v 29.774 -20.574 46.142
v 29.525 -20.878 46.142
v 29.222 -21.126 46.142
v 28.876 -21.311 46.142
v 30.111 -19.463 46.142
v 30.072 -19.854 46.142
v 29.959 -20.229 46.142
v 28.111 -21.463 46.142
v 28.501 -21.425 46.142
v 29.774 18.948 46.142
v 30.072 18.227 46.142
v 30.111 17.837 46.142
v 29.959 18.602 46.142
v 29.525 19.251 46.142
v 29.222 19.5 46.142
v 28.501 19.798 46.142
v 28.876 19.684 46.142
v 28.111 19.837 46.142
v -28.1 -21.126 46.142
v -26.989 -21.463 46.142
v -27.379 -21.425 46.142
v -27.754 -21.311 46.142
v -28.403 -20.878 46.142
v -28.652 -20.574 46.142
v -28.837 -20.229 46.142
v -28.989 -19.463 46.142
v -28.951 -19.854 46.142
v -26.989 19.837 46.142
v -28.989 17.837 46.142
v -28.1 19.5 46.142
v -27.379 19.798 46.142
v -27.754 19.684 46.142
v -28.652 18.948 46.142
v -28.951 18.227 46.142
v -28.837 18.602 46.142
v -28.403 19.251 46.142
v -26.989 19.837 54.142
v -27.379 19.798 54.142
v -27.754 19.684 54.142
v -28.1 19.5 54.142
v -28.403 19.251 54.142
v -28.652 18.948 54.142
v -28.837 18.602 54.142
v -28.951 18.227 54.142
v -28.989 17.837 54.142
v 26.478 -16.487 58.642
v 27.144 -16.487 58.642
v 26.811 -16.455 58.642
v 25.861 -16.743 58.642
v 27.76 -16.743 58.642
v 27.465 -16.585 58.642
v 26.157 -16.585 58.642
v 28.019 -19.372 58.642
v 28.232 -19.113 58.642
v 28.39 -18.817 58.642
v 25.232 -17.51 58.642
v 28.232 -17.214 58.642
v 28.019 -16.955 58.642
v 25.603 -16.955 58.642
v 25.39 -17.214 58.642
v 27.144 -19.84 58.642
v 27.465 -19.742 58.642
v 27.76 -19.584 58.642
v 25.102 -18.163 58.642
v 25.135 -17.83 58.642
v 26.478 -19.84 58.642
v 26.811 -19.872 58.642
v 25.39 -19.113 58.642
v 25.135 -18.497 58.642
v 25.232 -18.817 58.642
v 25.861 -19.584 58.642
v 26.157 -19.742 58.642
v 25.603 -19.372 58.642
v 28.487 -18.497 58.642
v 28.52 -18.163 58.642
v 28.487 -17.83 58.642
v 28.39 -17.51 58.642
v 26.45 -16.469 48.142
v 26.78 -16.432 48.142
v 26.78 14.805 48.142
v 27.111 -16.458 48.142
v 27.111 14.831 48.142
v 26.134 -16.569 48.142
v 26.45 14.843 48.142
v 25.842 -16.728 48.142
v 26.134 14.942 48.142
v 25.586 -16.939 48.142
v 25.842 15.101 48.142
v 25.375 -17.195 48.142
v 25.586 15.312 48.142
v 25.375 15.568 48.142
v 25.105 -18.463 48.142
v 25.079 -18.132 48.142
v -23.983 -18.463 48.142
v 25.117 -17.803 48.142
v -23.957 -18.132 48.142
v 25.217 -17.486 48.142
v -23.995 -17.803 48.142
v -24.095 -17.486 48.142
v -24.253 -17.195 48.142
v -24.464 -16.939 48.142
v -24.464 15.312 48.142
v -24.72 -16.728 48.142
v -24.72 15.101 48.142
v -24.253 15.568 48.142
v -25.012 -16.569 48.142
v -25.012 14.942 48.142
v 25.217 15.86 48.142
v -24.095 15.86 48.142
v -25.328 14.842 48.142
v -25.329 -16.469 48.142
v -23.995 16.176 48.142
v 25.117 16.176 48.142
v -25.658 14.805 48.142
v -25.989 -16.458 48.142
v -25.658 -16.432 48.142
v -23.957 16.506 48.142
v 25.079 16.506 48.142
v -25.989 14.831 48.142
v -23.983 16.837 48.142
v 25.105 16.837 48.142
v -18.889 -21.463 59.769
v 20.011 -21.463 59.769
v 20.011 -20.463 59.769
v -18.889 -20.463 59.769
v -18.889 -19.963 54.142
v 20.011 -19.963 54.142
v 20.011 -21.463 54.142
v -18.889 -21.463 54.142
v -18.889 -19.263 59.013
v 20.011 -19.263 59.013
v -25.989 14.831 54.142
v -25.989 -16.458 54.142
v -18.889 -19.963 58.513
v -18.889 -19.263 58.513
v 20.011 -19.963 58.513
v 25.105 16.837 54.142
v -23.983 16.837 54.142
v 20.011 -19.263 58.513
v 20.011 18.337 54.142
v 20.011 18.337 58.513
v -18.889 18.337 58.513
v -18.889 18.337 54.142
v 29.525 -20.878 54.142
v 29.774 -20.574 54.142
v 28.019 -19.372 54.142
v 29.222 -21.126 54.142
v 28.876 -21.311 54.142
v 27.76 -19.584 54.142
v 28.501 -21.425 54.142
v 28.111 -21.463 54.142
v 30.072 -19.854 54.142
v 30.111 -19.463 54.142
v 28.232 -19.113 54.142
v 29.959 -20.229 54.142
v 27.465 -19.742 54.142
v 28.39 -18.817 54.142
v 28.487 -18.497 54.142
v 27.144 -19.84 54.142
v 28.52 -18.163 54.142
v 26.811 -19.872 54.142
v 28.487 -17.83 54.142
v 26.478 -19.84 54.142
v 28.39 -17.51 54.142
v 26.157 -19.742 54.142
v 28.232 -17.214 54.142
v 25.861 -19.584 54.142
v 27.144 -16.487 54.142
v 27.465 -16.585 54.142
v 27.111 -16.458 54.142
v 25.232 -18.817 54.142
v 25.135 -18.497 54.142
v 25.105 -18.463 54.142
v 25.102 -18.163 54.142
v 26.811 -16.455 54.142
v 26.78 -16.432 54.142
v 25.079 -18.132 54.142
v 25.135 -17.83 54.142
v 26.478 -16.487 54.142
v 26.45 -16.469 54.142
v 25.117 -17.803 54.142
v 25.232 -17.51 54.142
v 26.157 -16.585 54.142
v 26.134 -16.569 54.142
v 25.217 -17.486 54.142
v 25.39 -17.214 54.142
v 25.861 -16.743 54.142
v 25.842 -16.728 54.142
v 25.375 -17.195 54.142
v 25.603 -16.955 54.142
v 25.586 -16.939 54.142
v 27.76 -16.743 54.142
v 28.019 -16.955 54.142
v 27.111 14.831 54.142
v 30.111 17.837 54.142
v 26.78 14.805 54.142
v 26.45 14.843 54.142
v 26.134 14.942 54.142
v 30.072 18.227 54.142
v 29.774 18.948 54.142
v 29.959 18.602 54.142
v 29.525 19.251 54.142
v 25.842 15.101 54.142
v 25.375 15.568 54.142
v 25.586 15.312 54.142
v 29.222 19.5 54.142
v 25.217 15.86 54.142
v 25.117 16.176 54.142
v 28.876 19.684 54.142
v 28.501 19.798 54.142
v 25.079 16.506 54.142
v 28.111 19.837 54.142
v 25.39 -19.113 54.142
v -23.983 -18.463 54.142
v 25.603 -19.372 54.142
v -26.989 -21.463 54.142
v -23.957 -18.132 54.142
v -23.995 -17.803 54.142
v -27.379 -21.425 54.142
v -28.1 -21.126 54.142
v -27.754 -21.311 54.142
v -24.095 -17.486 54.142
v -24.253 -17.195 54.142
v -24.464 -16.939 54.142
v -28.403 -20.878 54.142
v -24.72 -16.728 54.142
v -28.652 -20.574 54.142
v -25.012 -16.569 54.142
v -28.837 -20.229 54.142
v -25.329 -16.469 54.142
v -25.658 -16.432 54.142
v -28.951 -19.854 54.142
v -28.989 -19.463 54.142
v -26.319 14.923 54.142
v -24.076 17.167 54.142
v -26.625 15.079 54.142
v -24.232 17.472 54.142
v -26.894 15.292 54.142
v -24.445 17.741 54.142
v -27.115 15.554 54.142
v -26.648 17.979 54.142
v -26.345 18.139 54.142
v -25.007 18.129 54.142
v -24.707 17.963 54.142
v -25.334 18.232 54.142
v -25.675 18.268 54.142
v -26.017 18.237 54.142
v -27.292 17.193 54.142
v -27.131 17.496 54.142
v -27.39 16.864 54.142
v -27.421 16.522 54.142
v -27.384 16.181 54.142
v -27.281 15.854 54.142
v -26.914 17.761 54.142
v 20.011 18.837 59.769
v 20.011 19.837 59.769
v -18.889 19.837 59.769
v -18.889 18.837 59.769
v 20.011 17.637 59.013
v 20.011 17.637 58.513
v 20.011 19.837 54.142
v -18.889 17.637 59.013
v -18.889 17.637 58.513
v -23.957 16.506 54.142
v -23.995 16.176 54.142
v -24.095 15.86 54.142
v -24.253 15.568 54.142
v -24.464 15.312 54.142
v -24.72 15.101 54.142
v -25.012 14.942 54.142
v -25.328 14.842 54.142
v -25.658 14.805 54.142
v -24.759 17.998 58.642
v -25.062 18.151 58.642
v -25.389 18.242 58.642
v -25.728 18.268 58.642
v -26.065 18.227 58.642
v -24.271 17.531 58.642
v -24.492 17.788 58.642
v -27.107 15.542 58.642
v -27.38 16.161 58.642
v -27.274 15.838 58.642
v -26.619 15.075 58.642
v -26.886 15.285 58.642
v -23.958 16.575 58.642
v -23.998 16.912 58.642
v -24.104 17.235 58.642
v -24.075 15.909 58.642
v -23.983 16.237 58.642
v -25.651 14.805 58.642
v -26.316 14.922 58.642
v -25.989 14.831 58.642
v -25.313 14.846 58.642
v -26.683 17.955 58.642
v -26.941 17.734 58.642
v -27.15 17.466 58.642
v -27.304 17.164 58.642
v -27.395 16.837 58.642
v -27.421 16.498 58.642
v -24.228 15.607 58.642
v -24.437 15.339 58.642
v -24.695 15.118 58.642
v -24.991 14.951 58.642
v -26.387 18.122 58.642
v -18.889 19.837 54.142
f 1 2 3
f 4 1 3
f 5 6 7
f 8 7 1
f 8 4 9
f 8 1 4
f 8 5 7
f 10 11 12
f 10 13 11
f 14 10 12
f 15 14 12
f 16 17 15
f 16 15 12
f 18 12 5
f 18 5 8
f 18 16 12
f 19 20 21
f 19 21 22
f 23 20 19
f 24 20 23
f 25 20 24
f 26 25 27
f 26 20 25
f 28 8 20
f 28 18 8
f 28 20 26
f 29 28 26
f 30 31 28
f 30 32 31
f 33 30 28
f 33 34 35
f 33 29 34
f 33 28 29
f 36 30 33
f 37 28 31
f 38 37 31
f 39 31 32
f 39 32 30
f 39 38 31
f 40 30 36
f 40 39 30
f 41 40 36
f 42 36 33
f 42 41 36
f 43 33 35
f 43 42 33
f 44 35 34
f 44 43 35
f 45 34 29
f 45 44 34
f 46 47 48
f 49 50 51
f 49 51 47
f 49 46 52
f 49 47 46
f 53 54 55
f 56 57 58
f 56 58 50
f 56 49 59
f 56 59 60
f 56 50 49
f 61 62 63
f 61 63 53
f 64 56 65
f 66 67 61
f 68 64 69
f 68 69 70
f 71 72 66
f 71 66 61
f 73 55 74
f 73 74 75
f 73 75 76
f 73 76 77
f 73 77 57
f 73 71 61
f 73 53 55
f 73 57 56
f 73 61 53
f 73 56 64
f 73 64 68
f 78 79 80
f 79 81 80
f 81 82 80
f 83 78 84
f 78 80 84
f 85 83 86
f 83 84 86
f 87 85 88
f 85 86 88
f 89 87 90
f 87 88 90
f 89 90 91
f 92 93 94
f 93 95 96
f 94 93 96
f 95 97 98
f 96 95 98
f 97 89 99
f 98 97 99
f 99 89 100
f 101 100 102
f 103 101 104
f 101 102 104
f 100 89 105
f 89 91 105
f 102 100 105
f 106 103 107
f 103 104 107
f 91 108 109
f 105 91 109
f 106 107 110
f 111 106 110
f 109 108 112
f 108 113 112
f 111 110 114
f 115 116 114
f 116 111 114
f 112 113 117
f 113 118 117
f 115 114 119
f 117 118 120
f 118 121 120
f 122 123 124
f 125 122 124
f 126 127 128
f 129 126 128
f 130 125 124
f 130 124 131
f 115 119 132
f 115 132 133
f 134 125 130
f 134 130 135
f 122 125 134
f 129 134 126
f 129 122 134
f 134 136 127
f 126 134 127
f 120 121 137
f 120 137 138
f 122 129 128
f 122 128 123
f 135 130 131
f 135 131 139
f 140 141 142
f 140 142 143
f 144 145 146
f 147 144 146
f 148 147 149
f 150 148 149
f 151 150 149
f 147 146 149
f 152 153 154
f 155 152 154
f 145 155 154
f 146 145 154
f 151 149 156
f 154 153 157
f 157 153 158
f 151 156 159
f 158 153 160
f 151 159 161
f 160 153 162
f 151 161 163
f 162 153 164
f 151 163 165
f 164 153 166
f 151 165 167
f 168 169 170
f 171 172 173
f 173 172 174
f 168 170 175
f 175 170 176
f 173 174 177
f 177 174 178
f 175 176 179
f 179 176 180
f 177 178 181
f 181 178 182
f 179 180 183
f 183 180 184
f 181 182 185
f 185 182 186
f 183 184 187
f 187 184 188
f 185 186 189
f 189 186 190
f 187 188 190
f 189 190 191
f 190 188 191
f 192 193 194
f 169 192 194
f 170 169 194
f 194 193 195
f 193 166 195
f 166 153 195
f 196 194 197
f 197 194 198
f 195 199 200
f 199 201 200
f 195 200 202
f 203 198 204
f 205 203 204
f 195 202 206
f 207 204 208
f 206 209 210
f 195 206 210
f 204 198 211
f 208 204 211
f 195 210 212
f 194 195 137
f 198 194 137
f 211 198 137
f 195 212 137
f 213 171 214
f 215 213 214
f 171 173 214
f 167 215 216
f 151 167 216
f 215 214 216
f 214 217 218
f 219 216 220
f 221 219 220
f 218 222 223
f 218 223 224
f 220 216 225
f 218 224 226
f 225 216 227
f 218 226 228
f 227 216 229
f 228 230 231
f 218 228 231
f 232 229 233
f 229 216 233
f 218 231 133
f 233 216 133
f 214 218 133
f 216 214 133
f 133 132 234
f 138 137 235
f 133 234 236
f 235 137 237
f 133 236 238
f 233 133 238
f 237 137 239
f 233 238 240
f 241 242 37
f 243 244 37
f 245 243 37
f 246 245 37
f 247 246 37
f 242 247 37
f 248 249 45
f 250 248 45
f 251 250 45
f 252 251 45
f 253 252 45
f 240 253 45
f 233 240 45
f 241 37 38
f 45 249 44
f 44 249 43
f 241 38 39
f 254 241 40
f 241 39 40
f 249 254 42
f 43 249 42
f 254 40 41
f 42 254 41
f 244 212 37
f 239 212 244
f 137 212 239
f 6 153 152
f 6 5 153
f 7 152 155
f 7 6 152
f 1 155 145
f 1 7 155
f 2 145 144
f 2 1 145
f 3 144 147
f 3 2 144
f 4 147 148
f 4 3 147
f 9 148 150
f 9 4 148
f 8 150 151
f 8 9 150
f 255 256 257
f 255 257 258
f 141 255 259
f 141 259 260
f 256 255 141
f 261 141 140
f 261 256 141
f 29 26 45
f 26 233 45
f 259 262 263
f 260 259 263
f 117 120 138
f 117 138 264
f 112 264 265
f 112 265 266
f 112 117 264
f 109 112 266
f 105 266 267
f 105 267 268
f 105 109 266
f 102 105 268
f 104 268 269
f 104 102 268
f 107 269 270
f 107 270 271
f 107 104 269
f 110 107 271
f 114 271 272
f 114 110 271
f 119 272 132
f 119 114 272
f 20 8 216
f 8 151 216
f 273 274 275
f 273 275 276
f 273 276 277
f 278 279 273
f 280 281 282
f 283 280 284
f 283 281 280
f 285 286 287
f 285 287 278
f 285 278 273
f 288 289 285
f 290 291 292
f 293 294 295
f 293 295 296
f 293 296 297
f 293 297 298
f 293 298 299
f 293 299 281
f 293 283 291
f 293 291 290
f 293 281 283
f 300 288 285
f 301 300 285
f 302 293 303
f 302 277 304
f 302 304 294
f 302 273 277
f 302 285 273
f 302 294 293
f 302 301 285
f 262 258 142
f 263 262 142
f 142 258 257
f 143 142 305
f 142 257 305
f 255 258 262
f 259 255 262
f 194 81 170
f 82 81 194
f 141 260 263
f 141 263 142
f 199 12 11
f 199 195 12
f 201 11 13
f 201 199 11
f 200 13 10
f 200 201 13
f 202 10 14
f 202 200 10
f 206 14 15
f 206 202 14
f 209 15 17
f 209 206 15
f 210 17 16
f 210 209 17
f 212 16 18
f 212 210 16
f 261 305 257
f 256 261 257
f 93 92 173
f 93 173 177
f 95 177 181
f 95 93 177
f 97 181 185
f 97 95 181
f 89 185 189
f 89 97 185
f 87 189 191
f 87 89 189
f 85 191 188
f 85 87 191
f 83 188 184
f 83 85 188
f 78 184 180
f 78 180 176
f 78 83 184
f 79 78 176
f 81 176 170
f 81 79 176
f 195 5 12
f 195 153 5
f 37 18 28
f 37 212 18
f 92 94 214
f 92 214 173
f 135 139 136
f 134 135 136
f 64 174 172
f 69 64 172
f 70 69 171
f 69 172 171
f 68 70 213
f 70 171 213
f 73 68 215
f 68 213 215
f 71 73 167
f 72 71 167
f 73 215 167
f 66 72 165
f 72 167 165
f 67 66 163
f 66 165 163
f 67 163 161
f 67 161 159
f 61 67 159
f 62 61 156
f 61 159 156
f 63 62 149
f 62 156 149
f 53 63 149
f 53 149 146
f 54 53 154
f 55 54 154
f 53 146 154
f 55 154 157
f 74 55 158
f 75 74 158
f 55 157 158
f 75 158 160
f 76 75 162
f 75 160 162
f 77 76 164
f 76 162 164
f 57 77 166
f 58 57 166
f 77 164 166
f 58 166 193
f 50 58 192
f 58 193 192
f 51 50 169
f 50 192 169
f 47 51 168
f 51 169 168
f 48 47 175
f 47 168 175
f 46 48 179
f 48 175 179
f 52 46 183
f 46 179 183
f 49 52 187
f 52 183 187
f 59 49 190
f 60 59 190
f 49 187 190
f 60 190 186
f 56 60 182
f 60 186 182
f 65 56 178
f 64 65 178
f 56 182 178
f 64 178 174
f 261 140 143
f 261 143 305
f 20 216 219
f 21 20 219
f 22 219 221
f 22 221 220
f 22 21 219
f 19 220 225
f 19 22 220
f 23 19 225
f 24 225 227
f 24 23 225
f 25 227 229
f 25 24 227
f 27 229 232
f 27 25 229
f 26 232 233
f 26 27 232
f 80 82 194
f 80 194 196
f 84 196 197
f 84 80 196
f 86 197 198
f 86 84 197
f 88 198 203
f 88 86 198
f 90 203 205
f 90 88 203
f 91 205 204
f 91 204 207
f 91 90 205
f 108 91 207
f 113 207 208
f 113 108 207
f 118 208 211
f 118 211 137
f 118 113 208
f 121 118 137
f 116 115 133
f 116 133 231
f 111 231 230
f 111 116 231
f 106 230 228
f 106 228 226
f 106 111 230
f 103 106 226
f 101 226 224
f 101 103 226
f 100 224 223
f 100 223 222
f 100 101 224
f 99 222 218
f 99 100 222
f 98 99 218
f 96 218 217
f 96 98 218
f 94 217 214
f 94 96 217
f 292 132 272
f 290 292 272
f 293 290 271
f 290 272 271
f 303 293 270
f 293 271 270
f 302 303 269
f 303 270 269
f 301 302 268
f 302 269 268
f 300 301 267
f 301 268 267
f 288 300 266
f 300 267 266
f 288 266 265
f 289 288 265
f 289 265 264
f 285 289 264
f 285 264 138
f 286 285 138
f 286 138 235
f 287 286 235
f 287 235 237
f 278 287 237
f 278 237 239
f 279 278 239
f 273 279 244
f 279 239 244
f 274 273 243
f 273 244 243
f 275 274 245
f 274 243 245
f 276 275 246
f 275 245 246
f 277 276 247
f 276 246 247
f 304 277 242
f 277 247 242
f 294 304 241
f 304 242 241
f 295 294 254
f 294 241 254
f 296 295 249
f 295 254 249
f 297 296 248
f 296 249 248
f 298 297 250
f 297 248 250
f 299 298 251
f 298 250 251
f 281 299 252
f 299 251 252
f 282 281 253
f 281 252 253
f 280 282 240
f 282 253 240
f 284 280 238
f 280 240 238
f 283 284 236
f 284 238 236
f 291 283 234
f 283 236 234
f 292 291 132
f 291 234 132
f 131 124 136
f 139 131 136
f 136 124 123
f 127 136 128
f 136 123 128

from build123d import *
from build123d.topology import SkipClean

# Parameters (mm, degrees)
SZKIC1_W                    = 59.100010001
SZKIC1_H                    = 41.299998987
DODANIE_WYCI_GNI_CIE1_DEPTH = 6
SZKIC2_W                    = 59.100010001
SZKIC2_H                    = 41.299998987
DODANIE_WYCI_GNI_CIE2_DEPTH = 2
DODANIE_WYCI_GNI_CIE3_DEPTH = 49
WYTNIJ_WYCI_GNI_CIE2_DEPTH  = 10.1
SZKIC10_R                   = 1.708928953
SZKIC10_R_2                 = 1.732000006
DODANIE_WYCI_GNI_CIE4_DEPTH = 4.5
ZAOKR_GLENIE2_R             = 2


with BuildPart() as part:
    # Szkic1 → Dodanie-wyciągnięcie1 (new body)
    with BuildSketch(Plane(origin=(0, 0, 48.142497501), x_dir=(-1, 0, 0), z_dir=(0, 0, -1))):
        with Locations((-0.56091645, -0.813328838)):
            Rectangle(SZKIC1_W, SZKIC1_H)
        with BuildLine():
            ThreePointArc((-27.11092145, 14.830852979), (-25.586268211, 15.311972573), (-25.105290748, 16.836670655))
            Line((-25.105290748, 16.836670655), (23.983285891, 16.836670655))
            ThreePointArc((23.983285891, 16.836670655), (24.464316114, 15.311856195), (25.989088551, 14.830692784))
            Line((25.989088551, 14.830692784), (25.989088551, -16.45750804))
            ThreePointArc((25.989088551, -16.45750804), (24.464318208, -16.938605941), (23.983068356, -18.463328332))
            Line((23.983068356, -18.463328332), (-25.105072686, -18.463328332))
            ThreePointArc((-25.105072686, -18.463328332), (-25.586269943, -16.938721956), (-27.11092145, -16.457667715))
            Line((-27.11092145, -16.457667715), (-27.11092145, 14.830852979))
        make_face(mode=Mode.SUBTRACT)
    extrude(amount=-DODANIE_WYCI_GNI_CIE1_DEPTH)

    # Szkic2 → Dodanie-wyciągnięcie2 (add)
    with BuildSketch(Plane(origin=(0, 0, 48.142497501), x_dir=(-1, 0, 0), z_dir=(0, 0, -1))):
        with Locations((-0.56091645, -0.813328838)):
            Rectangle(SZKIC2_W, SZKIC2_H)
    extrude(amount=DODANIE_WYCI_GNI_CIE2_DEPTH)

    # Szkic10 → Dodanie-wyciągnięcie4 (add)
    with SkipClean():  # the faces are left unmerged after this step: merging them gives an invalid solid
        with BuildSketch(Plane.XY.offset(54.142497501)):
            with Locations((26.81092145, -18.163488345)):
                Circle(SZKIC10_R)
            with Locations((-25.68907855, 16.536511655)):
                Circle(SZKIC10_R_2)
        extrude(amount=DODANIE_WYCI_GNI_CIE4_DEPTH)

    # Zaokrąglenie2
    zaokr_glenie2_edges = [part.edges().sort_by_distance(p)[0] for p in [
        (-28.989088551, 19.836670655, 50.142497501),
        (30.11092145, 19.836670655, 50.142497501),
        (30.11092145, -21.463328332, 50.142497501),
        (-28.989088551, -21.463328332, 50.142497501),
    ]]
    fillet(zaokr_glenie2_edges, radius=ZAOKR_GLENIE2_R)


with BuildPart() as body_2:
    # Szkic5 → Dodanie-wyciągnięcie3 (new body)
    with BuildSketch(Plane(origin=(30.11092145, 0, 0), x_dir=(0, 0, -1), z_dir=(1, 0, 0))):
        Polygon((-54.142497501, 19.836670655), (-59.768947352, 19.836670655), (-59.768947352, 18.836670655), (-59.012699001, 17.636670655), (-58.512699001, 17.636670655), (-58.512699001, 18.336670655), (-54.142497501, 18.336670655), align=None)
    extrude(amount=-DODANIE_WYCI_GNI_CIE3_DEPTH)

    # Szkic5<2> → Wytnij-wyciągnięcie2 (cut)
    with BuildSketch(Plane(origin=(30.11092145, 0, 0), x_dir=(0, 0, -1), z_dir=(1, 0, 0))):
        Polygon((-54.142497501, 19.836670655), (-59.768947352, 19.836670655), (-59.768947352, 18.836670655), (-59.012699001, 17.636670655), (-58.512699001, 17.636670655), (-58.512699001, 18.336670655), (-54.142497501, 18.336670655), align=None)
    extrude(amount=-WYTNIJ_WYCI_GNI_CIE2_DEPTH, mode=Mode.SUBTRACT)


with BuildPart() as body_3:
    # Lustro3: mirrored copy
    add(body_2.part.mirror(Plane(origin=(0, -0.813328839, 0), x_dir=(0, 0, 1), z_dir=(0, -1, 0))))


solid = Compound([part.part, body_2.part, body_3.part])
